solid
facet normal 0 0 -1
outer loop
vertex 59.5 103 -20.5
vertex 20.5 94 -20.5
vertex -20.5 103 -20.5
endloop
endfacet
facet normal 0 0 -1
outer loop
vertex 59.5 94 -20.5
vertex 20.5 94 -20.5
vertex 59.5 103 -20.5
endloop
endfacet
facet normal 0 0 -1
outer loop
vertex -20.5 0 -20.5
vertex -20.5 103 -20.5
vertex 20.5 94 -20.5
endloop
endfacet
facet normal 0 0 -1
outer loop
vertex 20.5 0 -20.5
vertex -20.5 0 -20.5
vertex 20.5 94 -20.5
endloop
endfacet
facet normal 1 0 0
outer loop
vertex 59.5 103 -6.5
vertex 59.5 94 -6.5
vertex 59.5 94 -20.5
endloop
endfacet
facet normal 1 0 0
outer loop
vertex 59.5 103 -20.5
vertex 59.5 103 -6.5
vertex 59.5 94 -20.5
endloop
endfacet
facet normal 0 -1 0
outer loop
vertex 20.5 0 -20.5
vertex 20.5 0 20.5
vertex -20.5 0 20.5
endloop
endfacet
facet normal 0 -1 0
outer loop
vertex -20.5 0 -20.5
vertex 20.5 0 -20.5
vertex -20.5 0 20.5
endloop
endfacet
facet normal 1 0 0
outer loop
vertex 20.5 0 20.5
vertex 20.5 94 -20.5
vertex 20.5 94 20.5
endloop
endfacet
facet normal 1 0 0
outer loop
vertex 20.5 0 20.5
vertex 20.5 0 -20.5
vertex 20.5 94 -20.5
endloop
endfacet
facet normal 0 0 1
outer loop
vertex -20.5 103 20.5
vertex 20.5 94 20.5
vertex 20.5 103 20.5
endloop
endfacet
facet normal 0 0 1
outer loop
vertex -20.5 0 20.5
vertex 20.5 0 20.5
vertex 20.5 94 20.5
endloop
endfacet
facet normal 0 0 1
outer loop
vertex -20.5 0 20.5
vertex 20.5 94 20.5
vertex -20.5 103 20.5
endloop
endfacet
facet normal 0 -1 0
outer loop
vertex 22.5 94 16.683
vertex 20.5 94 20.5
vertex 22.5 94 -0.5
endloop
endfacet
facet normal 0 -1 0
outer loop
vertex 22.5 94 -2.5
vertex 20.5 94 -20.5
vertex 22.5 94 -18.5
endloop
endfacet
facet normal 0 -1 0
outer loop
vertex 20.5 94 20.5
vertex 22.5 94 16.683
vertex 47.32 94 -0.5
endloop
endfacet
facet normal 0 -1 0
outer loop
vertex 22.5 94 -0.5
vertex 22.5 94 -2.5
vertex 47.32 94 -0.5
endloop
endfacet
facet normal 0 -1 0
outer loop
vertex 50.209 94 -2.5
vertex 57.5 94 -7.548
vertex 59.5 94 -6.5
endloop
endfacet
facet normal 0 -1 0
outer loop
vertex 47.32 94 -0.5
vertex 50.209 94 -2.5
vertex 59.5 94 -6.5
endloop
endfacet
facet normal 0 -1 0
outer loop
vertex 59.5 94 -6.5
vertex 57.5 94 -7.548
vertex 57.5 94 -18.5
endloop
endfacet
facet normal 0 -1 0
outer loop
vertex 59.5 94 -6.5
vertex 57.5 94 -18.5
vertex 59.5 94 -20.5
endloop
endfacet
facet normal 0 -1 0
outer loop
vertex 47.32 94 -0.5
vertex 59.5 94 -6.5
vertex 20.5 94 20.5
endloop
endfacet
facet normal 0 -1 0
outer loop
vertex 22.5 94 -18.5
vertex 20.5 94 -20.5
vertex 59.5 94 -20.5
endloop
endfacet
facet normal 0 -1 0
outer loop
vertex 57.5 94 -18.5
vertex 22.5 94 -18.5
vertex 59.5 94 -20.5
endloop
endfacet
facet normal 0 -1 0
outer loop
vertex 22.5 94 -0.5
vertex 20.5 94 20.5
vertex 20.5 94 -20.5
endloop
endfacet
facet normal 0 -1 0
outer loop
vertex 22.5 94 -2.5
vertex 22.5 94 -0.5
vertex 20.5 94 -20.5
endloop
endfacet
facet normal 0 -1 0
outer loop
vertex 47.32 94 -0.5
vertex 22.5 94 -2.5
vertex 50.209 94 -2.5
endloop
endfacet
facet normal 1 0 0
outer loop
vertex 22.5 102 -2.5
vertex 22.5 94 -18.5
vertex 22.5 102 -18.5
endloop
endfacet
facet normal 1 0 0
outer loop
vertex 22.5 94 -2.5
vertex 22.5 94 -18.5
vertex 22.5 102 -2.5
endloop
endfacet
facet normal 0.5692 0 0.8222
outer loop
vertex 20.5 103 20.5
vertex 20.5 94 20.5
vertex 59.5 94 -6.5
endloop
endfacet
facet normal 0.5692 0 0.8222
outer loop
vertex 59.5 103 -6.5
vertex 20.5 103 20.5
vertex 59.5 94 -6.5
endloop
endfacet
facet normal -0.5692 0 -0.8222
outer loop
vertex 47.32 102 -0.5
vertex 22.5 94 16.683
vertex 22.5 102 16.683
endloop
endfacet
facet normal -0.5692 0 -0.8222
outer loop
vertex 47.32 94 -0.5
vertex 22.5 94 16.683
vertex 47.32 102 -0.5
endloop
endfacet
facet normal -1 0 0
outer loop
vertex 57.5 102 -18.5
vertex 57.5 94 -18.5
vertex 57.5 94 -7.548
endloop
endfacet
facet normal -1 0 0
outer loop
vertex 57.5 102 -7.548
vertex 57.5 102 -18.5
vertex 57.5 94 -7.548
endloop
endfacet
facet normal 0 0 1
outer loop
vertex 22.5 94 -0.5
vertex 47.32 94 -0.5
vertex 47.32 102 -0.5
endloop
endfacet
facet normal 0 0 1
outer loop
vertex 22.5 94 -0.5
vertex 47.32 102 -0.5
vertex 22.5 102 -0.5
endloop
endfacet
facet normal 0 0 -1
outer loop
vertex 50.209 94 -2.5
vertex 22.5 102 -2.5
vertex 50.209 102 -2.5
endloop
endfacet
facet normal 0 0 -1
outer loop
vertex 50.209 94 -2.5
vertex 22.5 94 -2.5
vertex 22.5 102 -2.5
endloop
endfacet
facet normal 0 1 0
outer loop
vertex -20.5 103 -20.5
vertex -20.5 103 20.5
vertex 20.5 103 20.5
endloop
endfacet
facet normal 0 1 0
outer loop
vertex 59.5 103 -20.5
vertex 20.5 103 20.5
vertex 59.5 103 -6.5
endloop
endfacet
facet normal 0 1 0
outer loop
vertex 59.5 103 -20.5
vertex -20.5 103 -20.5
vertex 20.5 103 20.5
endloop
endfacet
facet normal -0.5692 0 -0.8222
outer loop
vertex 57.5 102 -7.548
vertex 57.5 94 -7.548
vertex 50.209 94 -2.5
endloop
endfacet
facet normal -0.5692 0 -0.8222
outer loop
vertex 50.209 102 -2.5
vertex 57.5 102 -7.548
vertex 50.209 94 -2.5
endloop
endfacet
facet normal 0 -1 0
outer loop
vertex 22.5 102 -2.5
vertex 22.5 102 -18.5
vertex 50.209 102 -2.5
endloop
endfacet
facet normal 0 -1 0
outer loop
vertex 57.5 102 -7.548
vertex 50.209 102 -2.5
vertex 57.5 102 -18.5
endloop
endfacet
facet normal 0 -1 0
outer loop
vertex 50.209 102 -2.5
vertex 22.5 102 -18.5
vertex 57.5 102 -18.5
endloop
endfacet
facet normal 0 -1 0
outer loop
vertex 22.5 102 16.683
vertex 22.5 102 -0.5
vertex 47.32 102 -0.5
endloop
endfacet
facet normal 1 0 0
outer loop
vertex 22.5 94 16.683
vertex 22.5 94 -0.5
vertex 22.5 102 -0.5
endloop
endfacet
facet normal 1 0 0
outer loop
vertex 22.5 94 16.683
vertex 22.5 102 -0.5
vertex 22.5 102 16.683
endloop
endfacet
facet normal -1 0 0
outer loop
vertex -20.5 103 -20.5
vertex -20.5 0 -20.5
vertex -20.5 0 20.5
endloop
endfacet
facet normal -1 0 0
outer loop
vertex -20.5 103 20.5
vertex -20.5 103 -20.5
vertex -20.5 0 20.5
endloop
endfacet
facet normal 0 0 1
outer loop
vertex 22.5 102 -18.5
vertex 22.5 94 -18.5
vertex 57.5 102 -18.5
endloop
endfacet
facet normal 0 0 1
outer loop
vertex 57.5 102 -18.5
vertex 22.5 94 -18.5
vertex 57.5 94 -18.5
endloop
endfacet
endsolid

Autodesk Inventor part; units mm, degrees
ref_plane "YZ Plane" through (0, 0, 0) normal (1, 0, 0) x (0, 1, 0)
ref_plane "XZ Plane" through (0, 0, 0) normal (0, 1, 0) x (-1, 0, 0)
ref_plane "XY Plane" through (0, 0, 0) normal (0, 0, 1) x (1, 0, 0)
sketch "Boceto1" plane through (0, 0, 0) normal (0, 1, 0) x (-1, 0, 0)
  line L0 (20.5, -20.5) -> (-20.5, -20.5)
  line L1 (-20.5, -20.5) -> (-20.5, 20.5)
  line L2 (-20.5, 20.5) -> (20.5, 20.5)
  line L3 (20.5, 20.5) -> (20.5, -20.5)
  point P0 (0, 0)
  point P1 (0, -20.5)
  point P2 (-20.5, 0)
  dimension "d0" = 41
  dimension "d1" = 41
extrude "Extrusión1" add sketch "Boceto1" along normal blind 94
sketch "Boceto2" plane through (0, 94, 0) normal (0, 1, 0) x (1, 0, 0)
  line L0 (20.5, 20.5) -> (-20.5, 20.5) projected
  line L1 (-20.5, 20.5) -> (59.5, 20.5)
  line L2 (59.5, 20.5) -> (59.5, 6.5)
  line L3 (-20.5, -20.5) -> (20.5, -20.5) projected
  line L4 (59.5, 6.5) -> (20.5, -20.5)
  line L5 (20.5, -20.5) -> (20.5, 20.5) projected
  line L6 (50.8333, 0.5) -> (20.5, 0.5)
  line L7 (22.5, 18.5) -> (57.5, 18.5)
  line L8 (57.5, 18.5) -> (57.5, 7.5479)
  line L9 (57.5, 7.5479) -> (50.2086, 2.5)
  line L10 (22.5, 18.5) -> (22.5, 2.5)
  line L11 (22.5, 2.5) -> (50.2086, 2.5)
  line L12 (22.5, 0.5) -> (22.5, -16.6829)
  line L13 (22.5, -16.6829) -> (47.3197, 0.5)
  point P0 (0, 0)
  point P1 (36.3543, 2.5)
  dimension "d4" = 80
  dimension "d5" = 14
  dimension "d9" = 2
  dimension "d10" = 2
  dimension "d11" = 2
  dimension "d12" = 2
  dimension "d13" = 2
  dimension "d20" = 5.0479
extrude "Extrusión2" add sketch "Boceto2" along normal blind 8 contours L1 L2 L4 L6 L5 | L6 L12 L13 L4 L5
sketch "Boceto3" plane through (0, 94, 0) normal (0, 1, 0) x (1, 0, 0)
  line L0 (-20.5, 20.5) -> (-20.5, -20.5) projected
  line L1 (20.5, -20.5) -> (59.5, 6.5) projected
  line L2 (-20.5, 20.5) -> (20.5, 20.5)
  line L3 (20.5, 20.5) -> (20.5, -20.5)
  line L4 (20.5, -20.5) -> (-20.5, -20.5)
  line L5 (-20.5, -20.5) -> (-20.5, 20.5)
  point P0 (0, 0)
extrude "Extrusión3" add sketch "Boceto3" along normal blind 8
sketch "Boceto4" plane through (0, 102, 0) normal (0, 1, 0) x (1, 0, 0)
  point P0 (0, 0)
sketch "Boceto6" plane through (0, 102, 0) normal (0, 1, 0) x (1, 0, 0)
  line L0 (-20.5, 20.5) -> (-20.5, -20.5) projected
  line L1 (59.5, 6.5) -> (59.5, 20.5) projected
  line L2 (-20.5, 20.5) -> (59.5, 20.5)
  line L3 (59.5, 20.5) -> (59.5, 6.5)
  line L4 (20.5, -20.5) -> (59.5, 6.5) projected
  line L5 (59.5, 6.5) -> (20.5, -20.5)
  line L6 (20.5, -20.5) -> (-20.5, -20.5)
  line L7 (-20.5, -20.5) -> (-20.5, 20.5)
  point P0 (0, 0)
extrude "Extrusión5" add sketch "Boceto6" along normal blind 1
properties part number "Pata1"
